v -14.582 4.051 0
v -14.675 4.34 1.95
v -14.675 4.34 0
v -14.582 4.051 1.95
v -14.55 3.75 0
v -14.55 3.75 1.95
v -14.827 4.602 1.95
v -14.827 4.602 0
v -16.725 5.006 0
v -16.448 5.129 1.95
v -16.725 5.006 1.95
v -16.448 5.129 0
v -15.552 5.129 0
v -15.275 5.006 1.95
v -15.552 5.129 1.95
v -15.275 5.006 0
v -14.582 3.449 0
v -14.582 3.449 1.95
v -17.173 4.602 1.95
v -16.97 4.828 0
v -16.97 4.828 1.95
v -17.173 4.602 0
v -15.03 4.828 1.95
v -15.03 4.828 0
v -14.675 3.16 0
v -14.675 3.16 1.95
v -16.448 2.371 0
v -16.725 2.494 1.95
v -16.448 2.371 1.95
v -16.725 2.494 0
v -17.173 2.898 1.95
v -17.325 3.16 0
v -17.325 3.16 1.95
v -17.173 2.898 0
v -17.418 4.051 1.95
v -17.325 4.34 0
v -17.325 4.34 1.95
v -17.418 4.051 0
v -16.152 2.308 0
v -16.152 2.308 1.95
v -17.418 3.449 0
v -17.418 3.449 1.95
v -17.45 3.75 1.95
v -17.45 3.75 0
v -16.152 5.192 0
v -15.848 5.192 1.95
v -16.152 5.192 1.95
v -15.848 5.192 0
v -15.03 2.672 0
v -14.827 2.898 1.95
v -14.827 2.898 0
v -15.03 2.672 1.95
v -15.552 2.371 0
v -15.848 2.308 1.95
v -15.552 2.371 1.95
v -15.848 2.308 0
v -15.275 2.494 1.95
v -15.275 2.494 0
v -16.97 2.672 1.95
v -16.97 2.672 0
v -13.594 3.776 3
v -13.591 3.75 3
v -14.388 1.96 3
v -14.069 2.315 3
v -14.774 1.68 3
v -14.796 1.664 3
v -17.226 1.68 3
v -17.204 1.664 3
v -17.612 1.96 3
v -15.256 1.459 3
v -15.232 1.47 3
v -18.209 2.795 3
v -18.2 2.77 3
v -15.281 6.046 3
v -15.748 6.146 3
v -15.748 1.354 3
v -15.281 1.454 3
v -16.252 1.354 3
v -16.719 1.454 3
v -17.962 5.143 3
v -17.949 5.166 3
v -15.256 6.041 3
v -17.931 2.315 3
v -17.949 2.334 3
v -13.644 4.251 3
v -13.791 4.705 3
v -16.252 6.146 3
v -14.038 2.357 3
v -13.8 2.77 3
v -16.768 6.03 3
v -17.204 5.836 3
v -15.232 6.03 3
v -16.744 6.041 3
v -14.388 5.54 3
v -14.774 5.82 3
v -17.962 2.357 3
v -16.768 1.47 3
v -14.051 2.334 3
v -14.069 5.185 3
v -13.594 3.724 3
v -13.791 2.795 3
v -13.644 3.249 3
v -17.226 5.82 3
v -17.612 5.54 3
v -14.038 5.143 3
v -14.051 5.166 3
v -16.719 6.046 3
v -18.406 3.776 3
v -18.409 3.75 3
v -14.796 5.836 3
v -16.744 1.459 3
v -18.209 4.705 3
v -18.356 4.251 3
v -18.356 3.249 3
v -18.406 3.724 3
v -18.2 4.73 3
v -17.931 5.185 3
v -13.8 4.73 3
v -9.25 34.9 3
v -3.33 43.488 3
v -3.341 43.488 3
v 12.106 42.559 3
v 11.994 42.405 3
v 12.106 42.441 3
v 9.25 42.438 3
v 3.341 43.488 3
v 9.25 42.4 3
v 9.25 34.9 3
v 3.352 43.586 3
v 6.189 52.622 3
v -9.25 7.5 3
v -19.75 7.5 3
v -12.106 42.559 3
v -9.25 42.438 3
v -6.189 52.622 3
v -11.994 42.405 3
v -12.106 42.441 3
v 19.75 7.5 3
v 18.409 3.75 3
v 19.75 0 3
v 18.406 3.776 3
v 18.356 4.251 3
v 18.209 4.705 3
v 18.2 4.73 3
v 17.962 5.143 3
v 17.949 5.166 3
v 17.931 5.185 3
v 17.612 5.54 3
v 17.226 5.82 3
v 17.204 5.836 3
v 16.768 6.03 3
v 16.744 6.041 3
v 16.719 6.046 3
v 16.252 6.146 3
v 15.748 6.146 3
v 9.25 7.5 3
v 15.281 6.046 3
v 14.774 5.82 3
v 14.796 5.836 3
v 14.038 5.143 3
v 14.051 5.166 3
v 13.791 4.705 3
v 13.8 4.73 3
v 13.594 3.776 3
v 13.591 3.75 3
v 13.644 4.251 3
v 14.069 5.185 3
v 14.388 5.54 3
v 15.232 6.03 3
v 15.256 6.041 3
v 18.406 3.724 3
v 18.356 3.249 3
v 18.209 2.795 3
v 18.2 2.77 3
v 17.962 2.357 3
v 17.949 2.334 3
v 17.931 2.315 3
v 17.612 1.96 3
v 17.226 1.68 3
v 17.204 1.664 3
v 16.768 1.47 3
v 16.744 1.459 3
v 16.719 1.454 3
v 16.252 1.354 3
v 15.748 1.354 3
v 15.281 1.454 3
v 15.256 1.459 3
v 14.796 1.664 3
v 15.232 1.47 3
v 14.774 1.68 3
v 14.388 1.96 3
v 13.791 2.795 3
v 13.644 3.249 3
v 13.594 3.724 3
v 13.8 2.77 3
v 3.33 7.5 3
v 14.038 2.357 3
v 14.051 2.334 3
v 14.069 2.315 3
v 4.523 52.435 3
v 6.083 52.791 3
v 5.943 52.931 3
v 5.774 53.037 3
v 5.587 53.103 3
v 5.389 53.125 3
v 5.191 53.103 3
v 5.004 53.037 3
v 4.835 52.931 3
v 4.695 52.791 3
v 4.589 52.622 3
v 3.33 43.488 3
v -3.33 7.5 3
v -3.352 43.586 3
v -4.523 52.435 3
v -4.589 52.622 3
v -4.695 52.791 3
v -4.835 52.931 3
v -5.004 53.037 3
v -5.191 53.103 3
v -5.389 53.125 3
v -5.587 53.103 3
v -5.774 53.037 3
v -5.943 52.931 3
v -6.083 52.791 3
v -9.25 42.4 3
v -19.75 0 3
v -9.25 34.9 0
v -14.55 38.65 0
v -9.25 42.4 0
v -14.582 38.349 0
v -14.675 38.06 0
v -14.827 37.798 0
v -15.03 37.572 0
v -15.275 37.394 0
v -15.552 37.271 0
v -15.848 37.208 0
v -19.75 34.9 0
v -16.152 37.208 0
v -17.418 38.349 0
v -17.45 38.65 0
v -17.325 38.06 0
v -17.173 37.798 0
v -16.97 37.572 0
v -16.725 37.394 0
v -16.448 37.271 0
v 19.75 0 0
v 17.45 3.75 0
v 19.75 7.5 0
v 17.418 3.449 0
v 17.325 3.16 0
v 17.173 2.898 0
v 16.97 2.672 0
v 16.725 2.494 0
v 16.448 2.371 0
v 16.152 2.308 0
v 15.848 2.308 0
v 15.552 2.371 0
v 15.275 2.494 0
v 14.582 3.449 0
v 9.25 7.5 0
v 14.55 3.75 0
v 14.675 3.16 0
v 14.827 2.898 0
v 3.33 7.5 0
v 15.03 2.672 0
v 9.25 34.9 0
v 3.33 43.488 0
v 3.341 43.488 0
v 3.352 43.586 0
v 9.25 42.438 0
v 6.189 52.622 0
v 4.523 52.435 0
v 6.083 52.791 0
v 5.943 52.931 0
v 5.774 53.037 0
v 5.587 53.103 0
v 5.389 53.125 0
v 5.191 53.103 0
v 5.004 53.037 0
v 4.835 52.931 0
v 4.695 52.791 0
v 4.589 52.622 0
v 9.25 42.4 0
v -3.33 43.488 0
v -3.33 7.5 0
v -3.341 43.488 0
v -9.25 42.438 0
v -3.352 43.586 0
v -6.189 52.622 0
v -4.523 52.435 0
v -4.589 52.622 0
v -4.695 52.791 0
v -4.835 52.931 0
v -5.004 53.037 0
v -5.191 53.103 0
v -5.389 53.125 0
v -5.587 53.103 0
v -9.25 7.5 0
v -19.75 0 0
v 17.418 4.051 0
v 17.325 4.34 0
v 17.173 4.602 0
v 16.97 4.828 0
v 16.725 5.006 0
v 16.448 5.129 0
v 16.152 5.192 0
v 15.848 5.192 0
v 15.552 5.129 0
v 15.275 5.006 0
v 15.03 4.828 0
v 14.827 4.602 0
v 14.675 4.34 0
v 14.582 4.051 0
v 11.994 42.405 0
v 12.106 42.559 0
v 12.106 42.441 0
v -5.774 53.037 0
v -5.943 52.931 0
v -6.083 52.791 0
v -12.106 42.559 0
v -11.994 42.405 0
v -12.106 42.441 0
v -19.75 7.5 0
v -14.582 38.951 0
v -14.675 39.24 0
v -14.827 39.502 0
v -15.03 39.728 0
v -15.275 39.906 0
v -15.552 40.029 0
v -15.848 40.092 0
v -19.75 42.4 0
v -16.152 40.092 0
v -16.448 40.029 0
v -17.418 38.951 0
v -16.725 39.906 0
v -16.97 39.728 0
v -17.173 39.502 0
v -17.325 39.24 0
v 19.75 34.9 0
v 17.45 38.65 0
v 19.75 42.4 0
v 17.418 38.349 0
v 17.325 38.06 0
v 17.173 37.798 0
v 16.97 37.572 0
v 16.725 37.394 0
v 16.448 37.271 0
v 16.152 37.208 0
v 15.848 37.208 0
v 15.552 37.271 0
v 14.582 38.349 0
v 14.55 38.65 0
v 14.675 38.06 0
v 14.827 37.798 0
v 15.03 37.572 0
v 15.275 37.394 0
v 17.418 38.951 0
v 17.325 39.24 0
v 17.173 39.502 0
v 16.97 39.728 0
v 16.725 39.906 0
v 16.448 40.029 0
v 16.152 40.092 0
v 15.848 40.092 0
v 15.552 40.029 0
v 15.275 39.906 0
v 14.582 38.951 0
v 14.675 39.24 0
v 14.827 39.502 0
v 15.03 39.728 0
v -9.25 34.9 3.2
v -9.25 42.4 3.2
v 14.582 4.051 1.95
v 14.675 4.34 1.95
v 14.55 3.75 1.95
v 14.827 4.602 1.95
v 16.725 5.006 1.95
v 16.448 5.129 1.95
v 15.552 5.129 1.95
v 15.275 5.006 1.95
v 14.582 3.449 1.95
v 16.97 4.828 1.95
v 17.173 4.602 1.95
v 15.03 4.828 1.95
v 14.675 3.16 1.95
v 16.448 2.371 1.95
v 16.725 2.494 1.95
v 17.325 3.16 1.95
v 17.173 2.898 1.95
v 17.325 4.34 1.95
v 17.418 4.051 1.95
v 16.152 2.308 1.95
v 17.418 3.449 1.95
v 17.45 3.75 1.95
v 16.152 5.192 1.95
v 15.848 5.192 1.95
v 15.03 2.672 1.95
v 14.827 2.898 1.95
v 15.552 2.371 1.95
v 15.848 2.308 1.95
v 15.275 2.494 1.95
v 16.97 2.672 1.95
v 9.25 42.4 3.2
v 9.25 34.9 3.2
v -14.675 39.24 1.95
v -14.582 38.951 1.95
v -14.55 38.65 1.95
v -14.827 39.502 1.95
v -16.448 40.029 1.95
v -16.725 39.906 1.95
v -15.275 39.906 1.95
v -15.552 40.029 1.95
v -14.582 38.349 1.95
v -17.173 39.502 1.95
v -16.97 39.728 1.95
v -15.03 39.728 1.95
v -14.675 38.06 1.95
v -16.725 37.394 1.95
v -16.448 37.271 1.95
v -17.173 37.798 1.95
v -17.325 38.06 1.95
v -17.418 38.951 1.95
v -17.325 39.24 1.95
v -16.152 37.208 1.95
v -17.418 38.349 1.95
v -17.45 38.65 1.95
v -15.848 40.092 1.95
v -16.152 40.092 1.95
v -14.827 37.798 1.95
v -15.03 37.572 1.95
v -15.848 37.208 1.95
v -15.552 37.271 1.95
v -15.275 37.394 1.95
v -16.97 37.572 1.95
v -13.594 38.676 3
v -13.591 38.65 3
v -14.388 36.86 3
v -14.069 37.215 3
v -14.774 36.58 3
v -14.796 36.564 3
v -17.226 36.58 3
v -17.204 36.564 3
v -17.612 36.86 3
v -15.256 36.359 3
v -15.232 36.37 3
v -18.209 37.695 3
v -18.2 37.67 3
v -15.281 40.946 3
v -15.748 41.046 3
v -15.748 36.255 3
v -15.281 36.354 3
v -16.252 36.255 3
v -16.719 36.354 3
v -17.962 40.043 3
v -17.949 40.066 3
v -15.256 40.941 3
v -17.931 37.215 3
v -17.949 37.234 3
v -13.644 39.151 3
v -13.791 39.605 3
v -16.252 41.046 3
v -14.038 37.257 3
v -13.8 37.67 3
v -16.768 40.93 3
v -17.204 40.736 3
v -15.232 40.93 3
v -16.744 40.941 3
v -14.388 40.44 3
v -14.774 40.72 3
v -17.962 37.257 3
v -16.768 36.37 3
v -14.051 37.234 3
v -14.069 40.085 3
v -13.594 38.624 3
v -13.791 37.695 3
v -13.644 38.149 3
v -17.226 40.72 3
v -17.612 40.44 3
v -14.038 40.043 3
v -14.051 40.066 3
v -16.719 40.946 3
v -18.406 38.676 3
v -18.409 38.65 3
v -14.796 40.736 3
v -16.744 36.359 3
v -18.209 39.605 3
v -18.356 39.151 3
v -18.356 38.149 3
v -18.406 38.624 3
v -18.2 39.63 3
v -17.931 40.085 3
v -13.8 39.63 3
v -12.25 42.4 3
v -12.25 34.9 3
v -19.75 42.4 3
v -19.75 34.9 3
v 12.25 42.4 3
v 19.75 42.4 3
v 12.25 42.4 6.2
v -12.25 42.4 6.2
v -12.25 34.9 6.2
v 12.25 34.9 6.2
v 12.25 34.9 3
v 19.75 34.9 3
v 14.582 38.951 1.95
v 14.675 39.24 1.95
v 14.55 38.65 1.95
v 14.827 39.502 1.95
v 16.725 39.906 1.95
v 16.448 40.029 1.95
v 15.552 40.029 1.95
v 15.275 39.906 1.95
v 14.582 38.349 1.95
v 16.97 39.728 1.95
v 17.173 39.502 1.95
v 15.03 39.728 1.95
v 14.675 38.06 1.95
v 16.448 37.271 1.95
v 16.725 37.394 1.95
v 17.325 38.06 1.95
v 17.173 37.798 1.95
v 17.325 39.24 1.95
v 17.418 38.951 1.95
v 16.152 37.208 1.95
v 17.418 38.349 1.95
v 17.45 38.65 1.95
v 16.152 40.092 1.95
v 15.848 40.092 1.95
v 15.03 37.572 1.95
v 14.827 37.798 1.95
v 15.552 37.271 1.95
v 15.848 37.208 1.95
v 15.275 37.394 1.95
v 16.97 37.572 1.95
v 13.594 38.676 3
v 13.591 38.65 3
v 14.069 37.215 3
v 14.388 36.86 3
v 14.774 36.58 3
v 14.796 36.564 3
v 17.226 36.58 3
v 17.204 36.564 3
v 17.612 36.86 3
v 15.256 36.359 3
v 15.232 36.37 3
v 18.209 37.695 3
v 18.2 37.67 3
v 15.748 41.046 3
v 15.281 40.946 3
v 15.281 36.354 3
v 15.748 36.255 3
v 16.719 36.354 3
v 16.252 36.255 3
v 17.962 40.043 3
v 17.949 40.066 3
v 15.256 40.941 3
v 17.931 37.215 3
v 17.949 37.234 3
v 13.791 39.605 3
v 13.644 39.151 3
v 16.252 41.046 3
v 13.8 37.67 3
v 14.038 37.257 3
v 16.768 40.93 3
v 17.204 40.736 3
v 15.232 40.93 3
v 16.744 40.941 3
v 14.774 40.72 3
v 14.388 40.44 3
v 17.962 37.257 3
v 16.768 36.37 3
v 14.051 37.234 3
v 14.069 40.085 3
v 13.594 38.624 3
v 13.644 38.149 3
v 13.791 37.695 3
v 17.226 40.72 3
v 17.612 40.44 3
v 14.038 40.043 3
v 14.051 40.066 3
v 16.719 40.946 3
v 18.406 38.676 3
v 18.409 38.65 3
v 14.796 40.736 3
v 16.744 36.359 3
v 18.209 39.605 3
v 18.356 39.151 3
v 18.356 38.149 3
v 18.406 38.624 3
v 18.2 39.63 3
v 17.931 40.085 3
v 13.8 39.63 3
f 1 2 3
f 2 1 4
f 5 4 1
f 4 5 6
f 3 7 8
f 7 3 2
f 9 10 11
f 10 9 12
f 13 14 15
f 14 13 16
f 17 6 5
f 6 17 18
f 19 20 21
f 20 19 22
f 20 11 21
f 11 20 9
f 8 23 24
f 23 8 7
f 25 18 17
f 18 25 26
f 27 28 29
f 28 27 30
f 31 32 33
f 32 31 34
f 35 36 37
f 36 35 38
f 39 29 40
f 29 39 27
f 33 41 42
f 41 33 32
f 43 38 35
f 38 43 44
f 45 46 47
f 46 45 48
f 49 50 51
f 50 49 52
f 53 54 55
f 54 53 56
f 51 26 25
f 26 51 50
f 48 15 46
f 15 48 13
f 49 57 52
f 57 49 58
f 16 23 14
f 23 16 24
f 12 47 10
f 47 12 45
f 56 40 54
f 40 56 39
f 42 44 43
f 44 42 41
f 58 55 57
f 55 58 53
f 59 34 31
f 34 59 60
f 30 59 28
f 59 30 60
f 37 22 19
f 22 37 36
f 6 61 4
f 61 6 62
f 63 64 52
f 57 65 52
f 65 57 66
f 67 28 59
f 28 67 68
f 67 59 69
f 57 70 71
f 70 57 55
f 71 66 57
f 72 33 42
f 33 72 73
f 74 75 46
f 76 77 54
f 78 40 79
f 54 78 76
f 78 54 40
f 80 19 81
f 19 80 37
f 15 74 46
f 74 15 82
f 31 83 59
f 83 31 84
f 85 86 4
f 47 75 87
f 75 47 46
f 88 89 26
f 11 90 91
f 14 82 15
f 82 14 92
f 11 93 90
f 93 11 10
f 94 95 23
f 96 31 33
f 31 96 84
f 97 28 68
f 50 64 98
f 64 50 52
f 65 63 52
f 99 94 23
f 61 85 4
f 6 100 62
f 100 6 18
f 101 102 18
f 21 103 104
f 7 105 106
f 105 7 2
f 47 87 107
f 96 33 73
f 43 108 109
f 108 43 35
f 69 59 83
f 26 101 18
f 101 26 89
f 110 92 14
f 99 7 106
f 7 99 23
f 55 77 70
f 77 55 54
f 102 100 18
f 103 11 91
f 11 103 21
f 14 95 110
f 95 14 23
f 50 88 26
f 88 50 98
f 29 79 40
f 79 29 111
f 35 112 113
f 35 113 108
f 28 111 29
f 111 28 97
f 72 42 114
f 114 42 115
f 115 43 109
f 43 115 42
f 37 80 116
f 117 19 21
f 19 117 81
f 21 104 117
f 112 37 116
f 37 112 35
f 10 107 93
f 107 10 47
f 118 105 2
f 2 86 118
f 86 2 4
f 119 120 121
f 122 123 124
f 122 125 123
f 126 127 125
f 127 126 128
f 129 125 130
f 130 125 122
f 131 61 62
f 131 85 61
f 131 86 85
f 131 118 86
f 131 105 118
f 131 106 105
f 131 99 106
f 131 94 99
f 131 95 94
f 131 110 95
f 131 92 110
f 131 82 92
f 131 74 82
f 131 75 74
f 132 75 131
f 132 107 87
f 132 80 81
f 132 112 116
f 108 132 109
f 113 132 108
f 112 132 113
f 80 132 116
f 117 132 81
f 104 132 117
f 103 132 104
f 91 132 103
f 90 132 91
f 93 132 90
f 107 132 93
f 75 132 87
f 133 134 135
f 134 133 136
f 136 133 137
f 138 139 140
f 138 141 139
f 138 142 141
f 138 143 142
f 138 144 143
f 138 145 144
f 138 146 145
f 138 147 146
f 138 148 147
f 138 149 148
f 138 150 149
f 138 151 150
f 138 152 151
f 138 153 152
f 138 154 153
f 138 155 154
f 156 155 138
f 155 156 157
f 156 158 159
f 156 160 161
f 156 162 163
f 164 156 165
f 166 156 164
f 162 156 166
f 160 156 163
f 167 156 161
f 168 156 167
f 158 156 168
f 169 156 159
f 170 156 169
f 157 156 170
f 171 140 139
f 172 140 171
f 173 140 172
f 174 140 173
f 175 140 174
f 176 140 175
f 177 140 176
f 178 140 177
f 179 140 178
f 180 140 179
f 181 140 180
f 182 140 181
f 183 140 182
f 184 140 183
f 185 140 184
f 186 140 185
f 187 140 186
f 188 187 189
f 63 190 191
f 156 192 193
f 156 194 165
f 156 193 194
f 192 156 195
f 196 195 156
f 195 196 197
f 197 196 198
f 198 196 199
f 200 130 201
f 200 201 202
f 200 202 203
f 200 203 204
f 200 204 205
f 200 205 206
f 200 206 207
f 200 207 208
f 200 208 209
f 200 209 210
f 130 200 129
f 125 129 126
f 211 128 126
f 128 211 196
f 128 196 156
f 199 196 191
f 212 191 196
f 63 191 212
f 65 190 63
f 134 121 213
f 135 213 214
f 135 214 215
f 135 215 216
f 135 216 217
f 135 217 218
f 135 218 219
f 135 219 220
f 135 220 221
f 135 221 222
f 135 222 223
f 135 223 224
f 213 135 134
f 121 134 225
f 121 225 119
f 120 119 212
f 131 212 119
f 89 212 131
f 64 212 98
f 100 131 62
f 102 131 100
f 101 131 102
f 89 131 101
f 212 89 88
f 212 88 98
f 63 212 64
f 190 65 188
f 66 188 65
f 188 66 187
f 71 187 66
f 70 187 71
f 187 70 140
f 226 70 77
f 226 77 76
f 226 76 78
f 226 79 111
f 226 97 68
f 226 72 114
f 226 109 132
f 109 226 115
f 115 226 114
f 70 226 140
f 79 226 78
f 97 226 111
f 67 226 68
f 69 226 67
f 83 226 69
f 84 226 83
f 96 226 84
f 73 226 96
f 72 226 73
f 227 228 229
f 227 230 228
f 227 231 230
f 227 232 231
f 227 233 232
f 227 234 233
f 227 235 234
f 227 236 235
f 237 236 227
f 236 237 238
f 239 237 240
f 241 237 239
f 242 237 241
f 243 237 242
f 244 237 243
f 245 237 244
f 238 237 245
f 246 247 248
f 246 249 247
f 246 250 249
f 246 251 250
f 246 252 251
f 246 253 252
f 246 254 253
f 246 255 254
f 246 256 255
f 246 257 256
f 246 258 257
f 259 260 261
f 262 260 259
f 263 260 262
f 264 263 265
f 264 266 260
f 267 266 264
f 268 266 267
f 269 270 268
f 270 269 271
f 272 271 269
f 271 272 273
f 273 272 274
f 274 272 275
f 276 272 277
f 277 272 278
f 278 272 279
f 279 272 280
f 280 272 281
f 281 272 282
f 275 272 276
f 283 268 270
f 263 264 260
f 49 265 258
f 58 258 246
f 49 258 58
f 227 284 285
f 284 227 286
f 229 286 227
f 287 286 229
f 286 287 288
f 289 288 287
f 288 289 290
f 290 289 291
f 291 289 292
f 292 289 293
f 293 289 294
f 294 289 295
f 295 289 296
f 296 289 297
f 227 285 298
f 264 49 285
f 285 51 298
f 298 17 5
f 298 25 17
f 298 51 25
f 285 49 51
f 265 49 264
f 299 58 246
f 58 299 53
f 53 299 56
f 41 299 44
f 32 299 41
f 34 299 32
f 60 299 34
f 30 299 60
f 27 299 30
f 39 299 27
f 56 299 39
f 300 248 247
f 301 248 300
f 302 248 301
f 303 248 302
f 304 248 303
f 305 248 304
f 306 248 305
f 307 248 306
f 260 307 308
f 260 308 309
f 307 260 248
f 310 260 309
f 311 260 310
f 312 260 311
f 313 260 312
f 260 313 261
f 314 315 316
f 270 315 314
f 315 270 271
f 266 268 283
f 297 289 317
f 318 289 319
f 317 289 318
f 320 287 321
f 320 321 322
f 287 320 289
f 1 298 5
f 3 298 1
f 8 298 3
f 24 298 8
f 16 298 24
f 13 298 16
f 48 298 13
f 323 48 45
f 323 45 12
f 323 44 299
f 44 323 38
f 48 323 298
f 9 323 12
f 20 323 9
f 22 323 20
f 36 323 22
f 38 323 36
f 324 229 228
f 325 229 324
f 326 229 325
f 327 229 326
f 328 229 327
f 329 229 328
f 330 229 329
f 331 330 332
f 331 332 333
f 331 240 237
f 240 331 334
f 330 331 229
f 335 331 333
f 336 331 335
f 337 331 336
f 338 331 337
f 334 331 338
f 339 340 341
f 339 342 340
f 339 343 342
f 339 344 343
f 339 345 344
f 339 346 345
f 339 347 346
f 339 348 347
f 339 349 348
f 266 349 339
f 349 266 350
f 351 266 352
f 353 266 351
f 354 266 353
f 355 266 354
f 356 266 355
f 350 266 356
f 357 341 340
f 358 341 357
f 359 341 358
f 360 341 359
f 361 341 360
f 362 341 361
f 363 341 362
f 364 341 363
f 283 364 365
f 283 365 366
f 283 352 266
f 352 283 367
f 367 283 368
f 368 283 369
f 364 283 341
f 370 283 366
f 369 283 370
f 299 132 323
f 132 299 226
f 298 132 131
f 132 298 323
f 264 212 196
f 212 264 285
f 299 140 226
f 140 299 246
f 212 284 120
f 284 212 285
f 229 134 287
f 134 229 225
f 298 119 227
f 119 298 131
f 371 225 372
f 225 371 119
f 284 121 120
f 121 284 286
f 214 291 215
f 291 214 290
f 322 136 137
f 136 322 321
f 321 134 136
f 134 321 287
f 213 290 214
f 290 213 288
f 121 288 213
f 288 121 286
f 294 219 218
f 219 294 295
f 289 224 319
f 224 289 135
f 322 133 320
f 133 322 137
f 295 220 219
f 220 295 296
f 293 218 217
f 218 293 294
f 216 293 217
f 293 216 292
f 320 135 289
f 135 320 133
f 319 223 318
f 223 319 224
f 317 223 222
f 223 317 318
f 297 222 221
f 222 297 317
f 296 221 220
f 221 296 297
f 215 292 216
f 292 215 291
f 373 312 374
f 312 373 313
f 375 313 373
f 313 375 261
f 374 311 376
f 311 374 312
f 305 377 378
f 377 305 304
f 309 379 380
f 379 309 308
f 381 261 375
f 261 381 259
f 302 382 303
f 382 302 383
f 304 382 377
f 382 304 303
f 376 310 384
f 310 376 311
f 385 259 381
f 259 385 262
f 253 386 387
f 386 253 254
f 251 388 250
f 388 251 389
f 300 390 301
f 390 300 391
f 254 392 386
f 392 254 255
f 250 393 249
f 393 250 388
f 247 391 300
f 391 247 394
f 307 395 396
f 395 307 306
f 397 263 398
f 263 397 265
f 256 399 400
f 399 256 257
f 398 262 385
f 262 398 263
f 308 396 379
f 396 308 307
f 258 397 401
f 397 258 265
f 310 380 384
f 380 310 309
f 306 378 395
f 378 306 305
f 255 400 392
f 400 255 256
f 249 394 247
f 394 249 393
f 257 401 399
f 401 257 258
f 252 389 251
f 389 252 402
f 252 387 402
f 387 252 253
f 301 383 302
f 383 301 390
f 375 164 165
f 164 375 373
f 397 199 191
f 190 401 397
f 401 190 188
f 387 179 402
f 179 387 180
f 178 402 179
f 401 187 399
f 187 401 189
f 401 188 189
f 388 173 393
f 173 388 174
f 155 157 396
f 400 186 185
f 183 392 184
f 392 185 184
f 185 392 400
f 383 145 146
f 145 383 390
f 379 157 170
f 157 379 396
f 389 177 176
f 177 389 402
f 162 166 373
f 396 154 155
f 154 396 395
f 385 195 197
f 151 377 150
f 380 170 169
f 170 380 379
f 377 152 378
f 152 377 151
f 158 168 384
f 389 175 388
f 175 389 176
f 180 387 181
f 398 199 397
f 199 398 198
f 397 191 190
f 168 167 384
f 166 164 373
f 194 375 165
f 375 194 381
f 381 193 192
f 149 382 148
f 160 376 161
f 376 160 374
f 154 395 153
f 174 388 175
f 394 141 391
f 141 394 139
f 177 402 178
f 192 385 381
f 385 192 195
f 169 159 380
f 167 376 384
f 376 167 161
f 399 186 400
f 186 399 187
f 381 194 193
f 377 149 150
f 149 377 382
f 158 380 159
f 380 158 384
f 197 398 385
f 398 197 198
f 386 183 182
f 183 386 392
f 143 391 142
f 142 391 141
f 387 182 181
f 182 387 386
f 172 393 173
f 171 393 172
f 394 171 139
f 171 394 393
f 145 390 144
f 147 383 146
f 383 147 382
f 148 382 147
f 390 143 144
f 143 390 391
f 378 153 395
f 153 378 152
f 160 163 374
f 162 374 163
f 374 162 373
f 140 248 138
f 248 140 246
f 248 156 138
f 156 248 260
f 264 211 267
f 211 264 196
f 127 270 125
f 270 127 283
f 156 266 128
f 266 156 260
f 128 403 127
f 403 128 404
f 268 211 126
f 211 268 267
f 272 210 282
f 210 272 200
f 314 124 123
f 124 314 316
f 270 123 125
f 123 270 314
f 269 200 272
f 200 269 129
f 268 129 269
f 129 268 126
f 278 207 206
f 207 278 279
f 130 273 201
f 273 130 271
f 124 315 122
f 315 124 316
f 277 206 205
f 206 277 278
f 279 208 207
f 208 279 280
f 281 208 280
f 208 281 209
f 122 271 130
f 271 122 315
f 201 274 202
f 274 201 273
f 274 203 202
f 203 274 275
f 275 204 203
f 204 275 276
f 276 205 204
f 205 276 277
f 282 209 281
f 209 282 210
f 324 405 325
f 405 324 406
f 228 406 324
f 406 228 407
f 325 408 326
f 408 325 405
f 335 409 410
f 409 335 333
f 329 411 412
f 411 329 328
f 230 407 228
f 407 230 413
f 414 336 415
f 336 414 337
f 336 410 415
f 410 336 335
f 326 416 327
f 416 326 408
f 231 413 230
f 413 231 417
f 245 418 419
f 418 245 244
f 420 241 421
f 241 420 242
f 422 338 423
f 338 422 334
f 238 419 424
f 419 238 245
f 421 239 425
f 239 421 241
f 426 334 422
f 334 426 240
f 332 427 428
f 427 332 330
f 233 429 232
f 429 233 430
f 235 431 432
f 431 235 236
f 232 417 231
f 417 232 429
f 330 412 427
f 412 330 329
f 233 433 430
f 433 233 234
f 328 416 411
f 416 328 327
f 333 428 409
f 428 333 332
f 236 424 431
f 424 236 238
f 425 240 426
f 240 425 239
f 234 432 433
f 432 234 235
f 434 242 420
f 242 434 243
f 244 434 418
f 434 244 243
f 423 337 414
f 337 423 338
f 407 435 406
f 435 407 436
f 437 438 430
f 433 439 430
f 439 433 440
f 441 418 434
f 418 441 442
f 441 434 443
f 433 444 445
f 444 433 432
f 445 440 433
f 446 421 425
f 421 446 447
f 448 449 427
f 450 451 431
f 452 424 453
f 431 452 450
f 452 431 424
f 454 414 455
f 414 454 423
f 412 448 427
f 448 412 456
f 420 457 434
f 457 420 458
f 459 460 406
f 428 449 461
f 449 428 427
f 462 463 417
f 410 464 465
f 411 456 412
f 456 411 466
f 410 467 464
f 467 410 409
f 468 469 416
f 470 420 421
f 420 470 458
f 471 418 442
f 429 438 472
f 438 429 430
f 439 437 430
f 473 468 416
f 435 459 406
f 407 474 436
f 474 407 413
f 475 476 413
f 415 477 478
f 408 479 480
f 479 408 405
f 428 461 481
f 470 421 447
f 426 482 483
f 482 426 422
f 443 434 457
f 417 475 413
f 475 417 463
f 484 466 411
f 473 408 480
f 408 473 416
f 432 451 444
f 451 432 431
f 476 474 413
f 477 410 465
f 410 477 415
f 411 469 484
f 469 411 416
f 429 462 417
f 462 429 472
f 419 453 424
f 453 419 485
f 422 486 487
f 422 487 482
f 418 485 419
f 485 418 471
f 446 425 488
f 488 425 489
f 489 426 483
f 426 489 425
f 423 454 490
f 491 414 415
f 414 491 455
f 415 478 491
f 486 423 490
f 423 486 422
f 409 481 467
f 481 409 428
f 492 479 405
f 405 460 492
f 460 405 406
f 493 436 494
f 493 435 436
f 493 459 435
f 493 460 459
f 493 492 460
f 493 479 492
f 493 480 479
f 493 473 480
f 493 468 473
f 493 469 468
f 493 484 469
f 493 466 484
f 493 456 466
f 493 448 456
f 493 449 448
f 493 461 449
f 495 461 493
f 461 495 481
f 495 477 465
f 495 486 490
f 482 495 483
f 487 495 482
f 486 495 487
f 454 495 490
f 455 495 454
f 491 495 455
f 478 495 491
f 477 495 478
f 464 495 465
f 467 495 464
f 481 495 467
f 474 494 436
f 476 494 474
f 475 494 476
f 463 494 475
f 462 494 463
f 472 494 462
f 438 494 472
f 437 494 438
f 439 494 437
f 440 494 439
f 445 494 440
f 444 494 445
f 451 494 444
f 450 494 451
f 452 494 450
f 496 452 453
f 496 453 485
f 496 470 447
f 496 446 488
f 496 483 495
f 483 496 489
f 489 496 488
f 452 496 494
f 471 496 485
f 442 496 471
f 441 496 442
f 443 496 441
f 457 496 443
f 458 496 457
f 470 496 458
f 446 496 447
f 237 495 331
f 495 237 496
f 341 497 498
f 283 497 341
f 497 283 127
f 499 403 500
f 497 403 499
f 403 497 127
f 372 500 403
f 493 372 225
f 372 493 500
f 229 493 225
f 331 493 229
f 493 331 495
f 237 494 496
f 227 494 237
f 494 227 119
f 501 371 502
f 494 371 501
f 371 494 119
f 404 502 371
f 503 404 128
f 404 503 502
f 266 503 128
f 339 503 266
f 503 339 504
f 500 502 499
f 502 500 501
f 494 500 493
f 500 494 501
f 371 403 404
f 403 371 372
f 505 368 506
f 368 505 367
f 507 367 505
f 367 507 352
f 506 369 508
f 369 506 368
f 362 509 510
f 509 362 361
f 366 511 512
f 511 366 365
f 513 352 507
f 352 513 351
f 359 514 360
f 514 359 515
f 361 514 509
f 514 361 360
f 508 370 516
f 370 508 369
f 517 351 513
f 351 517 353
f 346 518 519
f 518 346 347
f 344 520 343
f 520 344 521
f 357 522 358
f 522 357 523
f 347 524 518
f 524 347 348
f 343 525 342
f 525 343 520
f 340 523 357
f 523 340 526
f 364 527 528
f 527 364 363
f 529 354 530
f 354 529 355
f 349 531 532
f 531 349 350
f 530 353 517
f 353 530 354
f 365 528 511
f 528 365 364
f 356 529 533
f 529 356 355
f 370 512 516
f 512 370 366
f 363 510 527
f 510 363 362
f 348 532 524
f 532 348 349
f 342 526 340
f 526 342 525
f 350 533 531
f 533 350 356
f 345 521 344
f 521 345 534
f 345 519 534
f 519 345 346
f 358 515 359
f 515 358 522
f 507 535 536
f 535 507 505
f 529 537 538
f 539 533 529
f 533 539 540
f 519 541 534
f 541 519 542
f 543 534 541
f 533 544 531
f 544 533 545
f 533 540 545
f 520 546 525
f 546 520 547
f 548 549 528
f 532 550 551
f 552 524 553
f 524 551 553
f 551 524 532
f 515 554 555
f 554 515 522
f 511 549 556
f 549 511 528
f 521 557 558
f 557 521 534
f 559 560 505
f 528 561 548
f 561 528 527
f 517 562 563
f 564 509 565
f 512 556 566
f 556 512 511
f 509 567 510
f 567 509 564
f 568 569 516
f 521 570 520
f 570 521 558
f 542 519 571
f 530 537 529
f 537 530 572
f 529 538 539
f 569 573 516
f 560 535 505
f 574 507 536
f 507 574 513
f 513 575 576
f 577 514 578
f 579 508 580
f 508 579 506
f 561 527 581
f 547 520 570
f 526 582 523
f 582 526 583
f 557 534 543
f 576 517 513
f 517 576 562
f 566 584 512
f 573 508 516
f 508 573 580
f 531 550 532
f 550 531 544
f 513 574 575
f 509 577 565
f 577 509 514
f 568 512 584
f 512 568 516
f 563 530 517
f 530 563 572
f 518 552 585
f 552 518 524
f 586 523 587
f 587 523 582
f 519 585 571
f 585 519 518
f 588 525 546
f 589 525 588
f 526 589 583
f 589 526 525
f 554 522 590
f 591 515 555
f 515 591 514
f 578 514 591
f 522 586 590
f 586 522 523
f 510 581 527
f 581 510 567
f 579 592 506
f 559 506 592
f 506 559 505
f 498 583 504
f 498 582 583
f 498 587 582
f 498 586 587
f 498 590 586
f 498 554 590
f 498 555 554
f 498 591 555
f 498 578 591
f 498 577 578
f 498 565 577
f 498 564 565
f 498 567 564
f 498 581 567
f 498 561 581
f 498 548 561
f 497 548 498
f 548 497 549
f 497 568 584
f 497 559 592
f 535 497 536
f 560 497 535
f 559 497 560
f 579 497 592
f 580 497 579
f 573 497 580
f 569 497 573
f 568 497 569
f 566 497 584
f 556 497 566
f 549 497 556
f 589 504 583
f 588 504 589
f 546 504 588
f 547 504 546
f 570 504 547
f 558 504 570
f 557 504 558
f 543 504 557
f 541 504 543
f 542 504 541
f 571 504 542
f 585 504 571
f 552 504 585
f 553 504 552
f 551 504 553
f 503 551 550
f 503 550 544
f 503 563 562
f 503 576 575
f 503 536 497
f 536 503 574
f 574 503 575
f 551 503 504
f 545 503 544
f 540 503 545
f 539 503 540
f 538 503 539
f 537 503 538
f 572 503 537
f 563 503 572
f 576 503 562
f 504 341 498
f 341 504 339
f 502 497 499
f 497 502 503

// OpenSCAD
//
//  Snap mechanism
//
//  by Egil Kvaleberg
//

// Which part
view = "demo"; 	// [demo, both, snap, bracket]

//
//  main parameters, tune as required:
//

// distance between centers of mount holes that seperate
mount_cc_dist = 35.0; 
mount_cc_width = 32.0;

// thickness of main part
thickness = 3.0; 

// mounting screw diameter
screw_dia = 2.5; // BUG: 3.0

screw_head = 2.0*screw_dia;

// tolerance
gap = 0.2; 

screw_land = screw_dia/2; // land outside of screw head

snap_width = mount_cc_width - 2*screw_land - screw_head - 2*thickness;  // width of mechanism proper
mount_width = mount_cc_width + 2*screw_land + screw_head;
mount_height = 2*screw_land + screw_head;
catch_width = snap_width * 0.15; // in addition to snap_width
snap_bar_width = (snap_width - 2.4 * catch_width) / 2; // room to flex
catch_min_width = 0.3 * snap_bar_width; // nicely rounded form
catch_length = (mount_height+mount_cc_dist) / 4;


d = 1*0.1;
$fs = 0.2;

module rounded_bar(r, h) {
	intersection() {
		cylinder(r=r, h=h);
		translate([0,0, h/2])
		cube([2*r * 0.85, 2*r* 0.85, h], center=true);
/*		hull() {
			translate([0, r, h/2 - r]) rotate([90,0,0]) cylinder(r=r, h=2*r);	
			translate([0, r, -(h/2 - r)]) rotate([90,0,0]) cylinder(r=r, h=2*r);		
		}
*/
	}
}

module screw_hole()
{
	sh = screw_head/2 - (screw_dia/2 + gap);	
	cylinder(r=screw_dia/2 + gap, h = d+thickness+d);
	translate([0, 0, d+thickness-sh])
		cylinder(r1=screw_dia/2 + gap, r2 = screw_head/2, h = sh+d);
}

module snap_half() {
	translate([-mount_width/2, 0, 0]) {
		// screw mount
		difference() {
			cube([mount_width/2 + d, mount_height, thickness]);
			translate([screw_land + screw_head/2, screw_land + screw_head/2, -d]) screw_hole();
		}
	}
	translate([-snap_width/2, 0, 0]) {
		// base arm
		cube([snap_bar_width, mount_height+mount_cc_dist+catch_min_width/2+d, thickness]);

		// catch
		translate([-catch_width, mount_height+mount_cc_dist, 0]) {
			hull() {
				cylinder(r=d, h=thickness); 
				translate([catch_width+snap_bar_width-catch_min_width/2, catch_min_width/2, 0]) 
					cylinder(r=catch_min_width/2, h=thickness); 
				// top of "arrow", sloping inwards to allow more bending
				translate([0.85 * (catch_width+snap_bar_width-catch_min_width/2), catch_length-catch_min_width/2, 0]) 
					cylinder(r=catch_min_width/2, h=thickness); 
			}
			//cube([catch_width, catch_length, thickness]);
		}

	}
}

module snap() {
	snap_half();
	mirror([1, 0, 0]) snap_half();	
}

module bracket_half() {

	translate([-mount_width/2, 0, 0]) {
		// screw mount
		difference() {
			cube([2*screw_land+screw_head+thickness, mount_height, thickness]);
			translate([screw_land + screw_head/2, screw_land + screw_head/2, -d]) screw_hole();
		}
		translate([2*screw_land+screw_head, 0, 0]) {
			cube([thickness, mount_height, thickness + gap + thickness]);
			translate([0, 0, gap + thickness]) {
				cube([snap_width/2 + thickness + d, mount_height, thickness]);
			}
		}

	}
}

module bracket() {
	bracket_half();
	mirror([1, 0, 0]) bracket_half();	
}

if (view == "demo") {
	snap();
	color("Red") translate([0, mount_cc_dist-d, 0]) bracket();
}
if (view == "snap") {
	snap();
}
if (view == "bracket") {
	translate([0, -2, 0]) rotate([90, 0, 0])  bracket();
}
if (view == "both") {
	snap();
	translate([0, -2, 0]) rotate([90, 0, 0])  bracket();
}
